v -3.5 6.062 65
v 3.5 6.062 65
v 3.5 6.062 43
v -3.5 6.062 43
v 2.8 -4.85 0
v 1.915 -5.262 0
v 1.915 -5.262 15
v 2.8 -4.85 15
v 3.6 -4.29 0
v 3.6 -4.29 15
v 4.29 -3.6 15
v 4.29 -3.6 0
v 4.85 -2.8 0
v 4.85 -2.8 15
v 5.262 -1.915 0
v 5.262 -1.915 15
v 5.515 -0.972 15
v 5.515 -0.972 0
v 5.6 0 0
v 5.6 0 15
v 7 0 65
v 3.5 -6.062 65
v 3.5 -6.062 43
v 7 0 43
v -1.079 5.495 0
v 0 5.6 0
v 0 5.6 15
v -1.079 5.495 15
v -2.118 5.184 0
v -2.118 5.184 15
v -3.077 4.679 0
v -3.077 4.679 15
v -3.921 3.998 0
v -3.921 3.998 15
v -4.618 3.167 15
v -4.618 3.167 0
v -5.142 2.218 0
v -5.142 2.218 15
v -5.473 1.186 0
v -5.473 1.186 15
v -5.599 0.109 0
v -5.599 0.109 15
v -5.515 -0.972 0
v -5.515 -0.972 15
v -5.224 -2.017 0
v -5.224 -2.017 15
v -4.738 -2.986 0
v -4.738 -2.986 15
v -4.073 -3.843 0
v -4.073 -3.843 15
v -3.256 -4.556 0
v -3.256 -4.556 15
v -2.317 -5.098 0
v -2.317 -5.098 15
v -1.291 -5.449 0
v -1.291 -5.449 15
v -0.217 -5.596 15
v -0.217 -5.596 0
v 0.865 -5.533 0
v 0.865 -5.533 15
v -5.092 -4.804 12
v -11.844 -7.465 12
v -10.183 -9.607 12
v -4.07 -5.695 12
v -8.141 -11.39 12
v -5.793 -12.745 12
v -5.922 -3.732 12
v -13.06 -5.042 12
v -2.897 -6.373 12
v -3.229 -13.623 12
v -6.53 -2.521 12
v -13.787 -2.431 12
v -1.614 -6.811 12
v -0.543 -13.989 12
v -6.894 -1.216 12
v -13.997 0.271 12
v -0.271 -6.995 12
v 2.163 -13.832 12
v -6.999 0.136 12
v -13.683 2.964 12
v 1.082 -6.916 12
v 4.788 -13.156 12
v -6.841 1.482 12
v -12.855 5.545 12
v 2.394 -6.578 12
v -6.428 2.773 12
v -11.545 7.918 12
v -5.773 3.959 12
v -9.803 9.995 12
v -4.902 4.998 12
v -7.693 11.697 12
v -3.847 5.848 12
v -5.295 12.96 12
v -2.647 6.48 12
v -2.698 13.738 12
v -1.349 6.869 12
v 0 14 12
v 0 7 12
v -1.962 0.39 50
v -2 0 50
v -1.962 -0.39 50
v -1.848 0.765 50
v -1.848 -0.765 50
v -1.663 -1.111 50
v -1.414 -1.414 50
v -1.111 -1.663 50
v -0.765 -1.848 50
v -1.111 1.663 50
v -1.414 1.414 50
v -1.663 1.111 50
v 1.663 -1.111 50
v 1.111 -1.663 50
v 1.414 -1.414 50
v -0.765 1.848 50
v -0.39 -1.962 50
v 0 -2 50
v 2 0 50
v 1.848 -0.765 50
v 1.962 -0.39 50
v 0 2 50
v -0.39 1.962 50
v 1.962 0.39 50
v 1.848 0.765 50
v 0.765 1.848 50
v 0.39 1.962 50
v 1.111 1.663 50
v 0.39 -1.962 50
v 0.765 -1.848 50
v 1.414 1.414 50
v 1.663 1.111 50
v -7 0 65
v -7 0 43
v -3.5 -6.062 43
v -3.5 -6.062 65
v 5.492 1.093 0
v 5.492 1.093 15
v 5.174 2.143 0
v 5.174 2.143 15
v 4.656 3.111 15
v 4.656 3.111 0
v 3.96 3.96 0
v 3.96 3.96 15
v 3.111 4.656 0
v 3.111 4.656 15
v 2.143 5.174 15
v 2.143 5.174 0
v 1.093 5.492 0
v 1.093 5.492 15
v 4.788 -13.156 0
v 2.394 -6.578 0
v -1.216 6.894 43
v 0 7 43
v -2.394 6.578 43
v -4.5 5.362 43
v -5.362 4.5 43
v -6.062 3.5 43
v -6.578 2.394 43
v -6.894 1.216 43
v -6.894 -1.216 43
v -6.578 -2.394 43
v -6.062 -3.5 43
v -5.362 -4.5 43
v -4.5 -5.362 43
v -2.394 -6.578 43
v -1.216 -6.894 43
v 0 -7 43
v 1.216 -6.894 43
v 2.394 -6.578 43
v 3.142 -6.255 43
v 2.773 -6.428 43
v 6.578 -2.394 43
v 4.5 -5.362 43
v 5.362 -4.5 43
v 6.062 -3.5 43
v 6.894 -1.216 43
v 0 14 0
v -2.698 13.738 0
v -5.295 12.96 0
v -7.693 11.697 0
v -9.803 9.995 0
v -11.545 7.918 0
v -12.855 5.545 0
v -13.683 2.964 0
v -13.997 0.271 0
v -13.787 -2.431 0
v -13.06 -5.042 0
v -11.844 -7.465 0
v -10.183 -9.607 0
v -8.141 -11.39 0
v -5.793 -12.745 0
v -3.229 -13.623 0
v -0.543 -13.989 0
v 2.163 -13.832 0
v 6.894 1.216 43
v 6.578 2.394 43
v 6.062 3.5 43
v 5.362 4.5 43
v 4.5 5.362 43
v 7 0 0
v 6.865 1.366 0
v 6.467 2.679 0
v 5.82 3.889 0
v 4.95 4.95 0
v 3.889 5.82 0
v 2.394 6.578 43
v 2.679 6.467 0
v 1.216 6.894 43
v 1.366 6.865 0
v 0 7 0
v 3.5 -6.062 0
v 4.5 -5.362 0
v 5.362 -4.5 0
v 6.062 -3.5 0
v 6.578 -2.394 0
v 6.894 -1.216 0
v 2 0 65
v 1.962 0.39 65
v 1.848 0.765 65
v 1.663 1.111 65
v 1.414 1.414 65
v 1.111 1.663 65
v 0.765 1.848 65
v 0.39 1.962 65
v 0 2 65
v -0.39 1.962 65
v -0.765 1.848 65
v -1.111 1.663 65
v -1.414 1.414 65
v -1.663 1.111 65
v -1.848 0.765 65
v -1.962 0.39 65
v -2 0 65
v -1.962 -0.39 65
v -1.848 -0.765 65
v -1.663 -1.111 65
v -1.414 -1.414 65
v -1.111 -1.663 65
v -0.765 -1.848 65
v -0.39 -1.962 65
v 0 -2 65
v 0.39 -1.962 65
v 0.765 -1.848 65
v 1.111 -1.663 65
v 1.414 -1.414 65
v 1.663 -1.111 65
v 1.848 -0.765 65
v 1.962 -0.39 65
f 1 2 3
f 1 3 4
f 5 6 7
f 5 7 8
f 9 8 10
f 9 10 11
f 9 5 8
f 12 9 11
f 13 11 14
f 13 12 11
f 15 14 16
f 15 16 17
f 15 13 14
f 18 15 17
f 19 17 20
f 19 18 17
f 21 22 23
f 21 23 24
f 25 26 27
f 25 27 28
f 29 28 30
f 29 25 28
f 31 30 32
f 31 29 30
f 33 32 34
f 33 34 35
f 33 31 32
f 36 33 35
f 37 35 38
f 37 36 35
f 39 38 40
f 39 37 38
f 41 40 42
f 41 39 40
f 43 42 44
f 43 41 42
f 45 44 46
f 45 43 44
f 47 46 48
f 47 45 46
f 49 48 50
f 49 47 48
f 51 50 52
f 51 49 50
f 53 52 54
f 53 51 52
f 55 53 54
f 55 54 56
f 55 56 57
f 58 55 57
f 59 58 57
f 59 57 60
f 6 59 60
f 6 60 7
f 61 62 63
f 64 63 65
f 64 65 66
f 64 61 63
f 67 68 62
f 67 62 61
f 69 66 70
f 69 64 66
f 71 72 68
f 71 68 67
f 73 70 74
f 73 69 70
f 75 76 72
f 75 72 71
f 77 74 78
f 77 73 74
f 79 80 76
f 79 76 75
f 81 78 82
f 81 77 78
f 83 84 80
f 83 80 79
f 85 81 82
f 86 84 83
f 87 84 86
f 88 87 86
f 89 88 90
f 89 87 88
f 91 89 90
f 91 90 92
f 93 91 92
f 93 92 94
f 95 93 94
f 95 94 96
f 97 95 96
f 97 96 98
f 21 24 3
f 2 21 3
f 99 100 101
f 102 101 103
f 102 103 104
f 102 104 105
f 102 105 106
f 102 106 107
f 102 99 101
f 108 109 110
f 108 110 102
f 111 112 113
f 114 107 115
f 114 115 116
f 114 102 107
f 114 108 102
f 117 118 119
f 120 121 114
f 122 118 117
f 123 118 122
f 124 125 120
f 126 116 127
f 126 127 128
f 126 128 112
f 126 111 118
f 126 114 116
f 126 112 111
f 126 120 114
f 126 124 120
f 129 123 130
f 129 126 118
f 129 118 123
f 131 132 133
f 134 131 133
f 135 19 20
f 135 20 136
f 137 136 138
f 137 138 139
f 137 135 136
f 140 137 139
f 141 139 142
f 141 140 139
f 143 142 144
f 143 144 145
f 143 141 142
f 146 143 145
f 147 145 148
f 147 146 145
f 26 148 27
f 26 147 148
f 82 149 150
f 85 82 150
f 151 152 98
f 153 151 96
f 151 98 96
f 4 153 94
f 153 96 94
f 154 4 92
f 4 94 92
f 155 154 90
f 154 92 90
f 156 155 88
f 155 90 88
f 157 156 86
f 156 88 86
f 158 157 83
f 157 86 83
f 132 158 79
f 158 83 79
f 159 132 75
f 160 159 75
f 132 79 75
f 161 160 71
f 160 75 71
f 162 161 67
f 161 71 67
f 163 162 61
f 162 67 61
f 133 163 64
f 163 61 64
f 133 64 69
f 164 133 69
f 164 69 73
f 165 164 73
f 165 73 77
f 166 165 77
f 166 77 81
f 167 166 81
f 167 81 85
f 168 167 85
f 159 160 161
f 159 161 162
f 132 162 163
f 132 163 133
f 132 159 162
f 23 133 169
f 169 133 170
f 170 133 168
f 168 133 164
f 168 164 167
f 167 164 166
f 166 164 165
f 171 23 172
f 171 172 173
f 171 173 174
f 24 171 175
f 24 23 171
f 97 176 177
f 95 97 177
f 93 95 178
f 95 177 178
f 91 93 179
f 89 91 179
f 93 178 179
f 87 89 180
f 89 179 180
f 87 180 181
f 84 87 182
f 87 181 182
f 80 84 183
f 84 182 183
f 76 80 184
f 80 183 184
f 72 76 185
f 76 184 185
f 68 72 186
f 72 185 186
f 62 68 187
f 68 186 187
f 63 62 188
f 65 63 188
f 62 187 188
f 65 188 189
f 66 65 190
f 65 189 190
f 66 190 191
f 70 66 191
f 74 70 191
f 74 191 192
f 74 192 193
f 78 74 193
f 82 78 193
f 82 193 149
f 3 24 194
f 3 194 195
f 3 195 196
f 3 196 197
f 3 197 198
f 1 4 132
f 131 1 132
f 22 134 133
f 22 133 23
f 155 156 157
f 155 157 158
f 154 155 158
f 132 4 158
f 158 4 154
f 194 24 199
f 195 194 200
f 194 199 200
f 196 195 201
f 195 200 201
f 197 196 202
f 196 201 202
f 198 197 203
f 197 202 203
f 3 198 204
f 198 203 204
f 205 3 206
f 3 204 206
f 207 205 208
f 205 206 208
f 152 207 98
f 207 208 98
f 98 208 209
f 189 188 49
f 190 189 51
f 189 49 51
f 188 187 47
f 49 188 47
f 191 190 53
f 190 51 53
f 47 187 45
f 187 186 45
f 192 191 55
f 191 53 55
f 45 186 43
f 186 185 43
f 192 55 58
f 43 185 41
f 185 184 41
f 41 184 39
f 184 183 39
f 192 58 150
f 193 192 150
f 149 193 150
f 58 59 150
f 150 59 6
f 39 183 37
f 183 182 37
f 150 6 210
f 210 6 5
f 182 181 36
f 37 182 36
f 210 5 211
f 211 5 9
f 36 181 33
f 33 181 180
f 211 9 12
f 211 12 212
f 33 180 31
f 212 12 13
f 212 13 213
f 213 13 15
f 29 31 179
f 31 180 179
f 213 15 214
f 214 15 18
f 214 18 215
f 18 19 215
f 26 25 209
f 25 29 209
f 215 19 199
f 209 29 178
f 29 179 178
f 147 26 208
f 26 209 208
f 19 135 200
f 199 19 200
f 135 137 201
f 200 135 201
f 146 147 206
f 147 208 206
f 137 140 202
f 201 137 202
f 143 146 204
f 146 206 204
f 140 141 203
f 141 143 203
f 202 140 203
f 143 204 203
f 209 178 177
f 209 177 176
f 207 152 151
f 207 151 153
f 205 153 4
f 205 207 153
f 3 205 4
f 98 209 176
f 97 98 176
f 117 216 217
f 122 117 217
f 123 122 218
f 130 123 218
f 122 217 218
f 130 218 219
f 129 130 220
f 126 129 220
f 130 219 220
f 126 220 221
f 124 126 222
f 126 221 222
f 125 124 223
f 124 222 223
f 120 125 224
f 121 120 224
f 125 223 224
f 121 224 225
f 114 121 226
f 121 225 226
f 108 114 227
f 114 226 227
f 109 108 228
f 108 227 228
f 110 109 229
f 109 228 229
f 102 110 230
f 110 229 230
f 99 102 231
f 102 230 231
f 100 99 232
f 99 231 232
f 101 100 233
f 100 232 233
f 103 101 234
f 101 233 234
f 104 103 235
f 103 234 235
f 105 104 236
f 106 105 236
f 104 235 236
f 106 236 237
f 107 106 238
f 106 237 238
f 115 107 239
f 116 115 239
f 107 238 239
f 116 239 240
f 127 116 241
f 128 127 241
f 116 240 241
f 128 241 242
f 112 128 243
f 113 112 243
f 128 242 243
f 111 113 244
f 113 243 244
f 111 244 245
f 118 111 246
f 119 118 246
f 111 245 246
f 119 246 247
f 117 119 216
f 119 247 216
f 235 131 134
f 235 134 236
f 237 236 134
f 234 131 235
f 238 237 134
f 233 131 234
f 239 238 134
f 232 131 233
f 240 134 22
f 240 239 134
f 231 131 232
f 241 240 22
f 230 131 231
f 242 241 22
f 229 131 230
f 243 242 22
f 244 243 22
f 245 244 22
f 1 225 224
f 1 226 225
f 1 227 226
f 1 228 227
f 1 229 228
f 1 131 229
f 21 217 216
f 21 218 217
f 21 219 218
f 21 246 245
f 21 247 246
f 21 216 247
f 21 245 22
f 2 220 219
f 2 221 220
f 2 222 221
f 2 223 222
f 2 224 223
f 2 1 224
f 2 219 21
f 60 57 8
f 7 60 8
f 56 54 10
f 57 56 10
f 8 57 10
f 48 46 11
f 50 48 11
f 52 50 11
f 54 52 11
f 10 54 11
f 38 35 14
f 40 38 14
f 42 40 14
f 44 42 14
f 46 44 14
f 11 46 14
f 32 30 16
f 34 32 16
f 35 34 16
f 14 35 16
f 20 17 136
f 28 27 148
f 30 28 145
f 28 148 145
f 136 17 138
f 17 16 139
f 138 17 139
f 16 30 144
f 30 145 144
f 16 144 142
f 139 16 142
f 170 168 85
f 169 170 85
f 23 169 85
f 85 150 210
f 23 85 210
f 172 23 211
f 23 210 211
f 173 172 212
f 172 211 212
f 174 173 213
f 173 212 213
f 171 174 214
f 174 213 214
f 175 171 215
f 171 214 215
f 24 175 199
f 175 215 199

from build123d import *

# Parameters (mm, degrees)
F1_DEPTH = 12
F2_DEPTH = 43
F4_DEPTH = 22
F5_R     = 2
F6_DEPTH = 15
F7_DEPTH = 15


with BuildPart() as f1:
    # F0 (on Top) → F1 (new body)
    with BuildSketch(Plane.XY):
        with BuildLine():
            ThreePointArc((2.394141, -6.577848), (5.734064, -4.015035), (7, 0))
            ThreePointArc((7, 0), (4.949747, 4.949747), (0, 7))
            Line((0, 7), (0, 5.6))
            ThreePointArc((0, 5.6), (3.959798, 3.959798), (5.6, 0))
            ThreePointArc((5.6, 0), (4.587251, -3.212028), (1.915313, -5.262279))
            Line((1.915313, -5.262279), (2.394141, -6.577848))
        make_face()
        with BuildLine():
            ThreePointArc((2.394141, -6.577848), (-6.893654, -1.215537), (0, 7))
            Line((0, 7), (0, 14))
            ThreePointArc((0, 14), (-13.787309, -2.431074), (4.788282, -13.155697))
            Line((4.788282, -13.155697), (2.394141, -6.577848))
        make_face()
    extrude(amount=F1_DEPTH)

    # F0 (on Top) → F2 (join)
    with BuildSketch(Plane.XY):
        with BuildLine():
            Line((0, 0), (0, 5.6))
            ThreePointArc((0, 5.6), (-5.514923, -0.97243), (1.915313, -5.262279))
            Line((1.915313, -5.262279), (0, 0))
        make_face()
        with BuildLine():
            ThreePointArc((5.6, 0), (3.959798, 3.959798), (0, 5.6))
            Line((0, 5.6), (0, 0))
            Line((0, 0), (1.915313, -5.262279))
            ThreePointArc((1.915313, -5.262279), (4.587251, -3.212028), (5.6, 0))
        make_face()
        with BuildLine():
            Line((0, 5.6), (0, 7))
            ThreePointArc((0, 7), (-6.893654, -1.215537), (2.394141, -6.577848))
            Line((2.394141, -6.577848), (1.915313, -5.262279))
            ThreePointArc((1.915313, -5.262279), (-5.514923, -0.97243), (0, 5.6))
        make_face()
        with BuildLine():
            ThreePointArc((2.394141, -6.577848), (5.734064, -4.015035), (7, 0))
            ThreePointArc((7, 0), (4.949747, 4.949747), (0, 7))
            Line((0, 7), (0, 5.6))
            ThreePointArc((0, 5.6), (3.959798, 3.959798), (5.6, 0))
            ThreePointArc((5.6, 0), (4.587251, -3.212028), (1.915313, -5.262279))
            Line((1.915313, -5.262279), (2.394141, -6.577848))
        make_face()
    extrude(amount=F2_DEPTH)

    # F3 (on face) → F4 (join)
    with BuildSketch(Plane.XY.offset(43)):
        Polygon((7, 0), (3.5, 6.062178), (-3.5, 6.062178), (-7, 0), (-3.5, -6.062178), (3.5, -6.062178), align=None)
    extrude(amount=F4_DEPTH)

    # F5 (on face) → F6 (cut)
    with BuildSketch(Plane.XY.offset(65)):
        Circle(F5_R)
    extrude(amount=-F6_DEPTH, mode=Mode.SUBTRACT)

    # F0 (on Top) → F7 (cut)
    with BuildSketch(Plane.XY):
        with BuildLine():
            Line((0, 0), (0, 5.6))
            ThreePointArc((0, 5.6), (-5.514923, -0.97243), (1.915313, -5.262279))
            Line((1.915313, -5.262279), (0, 0))
        make_face()
        with BuildLine():
            ThreePointArc((5.6, 0), (3.959798, 3.959798), (0, 5.6))
            Line((0, 5.6), (0, 0))
            Line((0, 0), (1.915313, -5.262279))
            ThreePointArc((1.915313, -5.262279), (4.587251, -3.212028), (5.6, 0))
        make_face()
    extrude(amount=F7_DEPTH, mode=Mode.SUBTRACT)


solid = f1.part
